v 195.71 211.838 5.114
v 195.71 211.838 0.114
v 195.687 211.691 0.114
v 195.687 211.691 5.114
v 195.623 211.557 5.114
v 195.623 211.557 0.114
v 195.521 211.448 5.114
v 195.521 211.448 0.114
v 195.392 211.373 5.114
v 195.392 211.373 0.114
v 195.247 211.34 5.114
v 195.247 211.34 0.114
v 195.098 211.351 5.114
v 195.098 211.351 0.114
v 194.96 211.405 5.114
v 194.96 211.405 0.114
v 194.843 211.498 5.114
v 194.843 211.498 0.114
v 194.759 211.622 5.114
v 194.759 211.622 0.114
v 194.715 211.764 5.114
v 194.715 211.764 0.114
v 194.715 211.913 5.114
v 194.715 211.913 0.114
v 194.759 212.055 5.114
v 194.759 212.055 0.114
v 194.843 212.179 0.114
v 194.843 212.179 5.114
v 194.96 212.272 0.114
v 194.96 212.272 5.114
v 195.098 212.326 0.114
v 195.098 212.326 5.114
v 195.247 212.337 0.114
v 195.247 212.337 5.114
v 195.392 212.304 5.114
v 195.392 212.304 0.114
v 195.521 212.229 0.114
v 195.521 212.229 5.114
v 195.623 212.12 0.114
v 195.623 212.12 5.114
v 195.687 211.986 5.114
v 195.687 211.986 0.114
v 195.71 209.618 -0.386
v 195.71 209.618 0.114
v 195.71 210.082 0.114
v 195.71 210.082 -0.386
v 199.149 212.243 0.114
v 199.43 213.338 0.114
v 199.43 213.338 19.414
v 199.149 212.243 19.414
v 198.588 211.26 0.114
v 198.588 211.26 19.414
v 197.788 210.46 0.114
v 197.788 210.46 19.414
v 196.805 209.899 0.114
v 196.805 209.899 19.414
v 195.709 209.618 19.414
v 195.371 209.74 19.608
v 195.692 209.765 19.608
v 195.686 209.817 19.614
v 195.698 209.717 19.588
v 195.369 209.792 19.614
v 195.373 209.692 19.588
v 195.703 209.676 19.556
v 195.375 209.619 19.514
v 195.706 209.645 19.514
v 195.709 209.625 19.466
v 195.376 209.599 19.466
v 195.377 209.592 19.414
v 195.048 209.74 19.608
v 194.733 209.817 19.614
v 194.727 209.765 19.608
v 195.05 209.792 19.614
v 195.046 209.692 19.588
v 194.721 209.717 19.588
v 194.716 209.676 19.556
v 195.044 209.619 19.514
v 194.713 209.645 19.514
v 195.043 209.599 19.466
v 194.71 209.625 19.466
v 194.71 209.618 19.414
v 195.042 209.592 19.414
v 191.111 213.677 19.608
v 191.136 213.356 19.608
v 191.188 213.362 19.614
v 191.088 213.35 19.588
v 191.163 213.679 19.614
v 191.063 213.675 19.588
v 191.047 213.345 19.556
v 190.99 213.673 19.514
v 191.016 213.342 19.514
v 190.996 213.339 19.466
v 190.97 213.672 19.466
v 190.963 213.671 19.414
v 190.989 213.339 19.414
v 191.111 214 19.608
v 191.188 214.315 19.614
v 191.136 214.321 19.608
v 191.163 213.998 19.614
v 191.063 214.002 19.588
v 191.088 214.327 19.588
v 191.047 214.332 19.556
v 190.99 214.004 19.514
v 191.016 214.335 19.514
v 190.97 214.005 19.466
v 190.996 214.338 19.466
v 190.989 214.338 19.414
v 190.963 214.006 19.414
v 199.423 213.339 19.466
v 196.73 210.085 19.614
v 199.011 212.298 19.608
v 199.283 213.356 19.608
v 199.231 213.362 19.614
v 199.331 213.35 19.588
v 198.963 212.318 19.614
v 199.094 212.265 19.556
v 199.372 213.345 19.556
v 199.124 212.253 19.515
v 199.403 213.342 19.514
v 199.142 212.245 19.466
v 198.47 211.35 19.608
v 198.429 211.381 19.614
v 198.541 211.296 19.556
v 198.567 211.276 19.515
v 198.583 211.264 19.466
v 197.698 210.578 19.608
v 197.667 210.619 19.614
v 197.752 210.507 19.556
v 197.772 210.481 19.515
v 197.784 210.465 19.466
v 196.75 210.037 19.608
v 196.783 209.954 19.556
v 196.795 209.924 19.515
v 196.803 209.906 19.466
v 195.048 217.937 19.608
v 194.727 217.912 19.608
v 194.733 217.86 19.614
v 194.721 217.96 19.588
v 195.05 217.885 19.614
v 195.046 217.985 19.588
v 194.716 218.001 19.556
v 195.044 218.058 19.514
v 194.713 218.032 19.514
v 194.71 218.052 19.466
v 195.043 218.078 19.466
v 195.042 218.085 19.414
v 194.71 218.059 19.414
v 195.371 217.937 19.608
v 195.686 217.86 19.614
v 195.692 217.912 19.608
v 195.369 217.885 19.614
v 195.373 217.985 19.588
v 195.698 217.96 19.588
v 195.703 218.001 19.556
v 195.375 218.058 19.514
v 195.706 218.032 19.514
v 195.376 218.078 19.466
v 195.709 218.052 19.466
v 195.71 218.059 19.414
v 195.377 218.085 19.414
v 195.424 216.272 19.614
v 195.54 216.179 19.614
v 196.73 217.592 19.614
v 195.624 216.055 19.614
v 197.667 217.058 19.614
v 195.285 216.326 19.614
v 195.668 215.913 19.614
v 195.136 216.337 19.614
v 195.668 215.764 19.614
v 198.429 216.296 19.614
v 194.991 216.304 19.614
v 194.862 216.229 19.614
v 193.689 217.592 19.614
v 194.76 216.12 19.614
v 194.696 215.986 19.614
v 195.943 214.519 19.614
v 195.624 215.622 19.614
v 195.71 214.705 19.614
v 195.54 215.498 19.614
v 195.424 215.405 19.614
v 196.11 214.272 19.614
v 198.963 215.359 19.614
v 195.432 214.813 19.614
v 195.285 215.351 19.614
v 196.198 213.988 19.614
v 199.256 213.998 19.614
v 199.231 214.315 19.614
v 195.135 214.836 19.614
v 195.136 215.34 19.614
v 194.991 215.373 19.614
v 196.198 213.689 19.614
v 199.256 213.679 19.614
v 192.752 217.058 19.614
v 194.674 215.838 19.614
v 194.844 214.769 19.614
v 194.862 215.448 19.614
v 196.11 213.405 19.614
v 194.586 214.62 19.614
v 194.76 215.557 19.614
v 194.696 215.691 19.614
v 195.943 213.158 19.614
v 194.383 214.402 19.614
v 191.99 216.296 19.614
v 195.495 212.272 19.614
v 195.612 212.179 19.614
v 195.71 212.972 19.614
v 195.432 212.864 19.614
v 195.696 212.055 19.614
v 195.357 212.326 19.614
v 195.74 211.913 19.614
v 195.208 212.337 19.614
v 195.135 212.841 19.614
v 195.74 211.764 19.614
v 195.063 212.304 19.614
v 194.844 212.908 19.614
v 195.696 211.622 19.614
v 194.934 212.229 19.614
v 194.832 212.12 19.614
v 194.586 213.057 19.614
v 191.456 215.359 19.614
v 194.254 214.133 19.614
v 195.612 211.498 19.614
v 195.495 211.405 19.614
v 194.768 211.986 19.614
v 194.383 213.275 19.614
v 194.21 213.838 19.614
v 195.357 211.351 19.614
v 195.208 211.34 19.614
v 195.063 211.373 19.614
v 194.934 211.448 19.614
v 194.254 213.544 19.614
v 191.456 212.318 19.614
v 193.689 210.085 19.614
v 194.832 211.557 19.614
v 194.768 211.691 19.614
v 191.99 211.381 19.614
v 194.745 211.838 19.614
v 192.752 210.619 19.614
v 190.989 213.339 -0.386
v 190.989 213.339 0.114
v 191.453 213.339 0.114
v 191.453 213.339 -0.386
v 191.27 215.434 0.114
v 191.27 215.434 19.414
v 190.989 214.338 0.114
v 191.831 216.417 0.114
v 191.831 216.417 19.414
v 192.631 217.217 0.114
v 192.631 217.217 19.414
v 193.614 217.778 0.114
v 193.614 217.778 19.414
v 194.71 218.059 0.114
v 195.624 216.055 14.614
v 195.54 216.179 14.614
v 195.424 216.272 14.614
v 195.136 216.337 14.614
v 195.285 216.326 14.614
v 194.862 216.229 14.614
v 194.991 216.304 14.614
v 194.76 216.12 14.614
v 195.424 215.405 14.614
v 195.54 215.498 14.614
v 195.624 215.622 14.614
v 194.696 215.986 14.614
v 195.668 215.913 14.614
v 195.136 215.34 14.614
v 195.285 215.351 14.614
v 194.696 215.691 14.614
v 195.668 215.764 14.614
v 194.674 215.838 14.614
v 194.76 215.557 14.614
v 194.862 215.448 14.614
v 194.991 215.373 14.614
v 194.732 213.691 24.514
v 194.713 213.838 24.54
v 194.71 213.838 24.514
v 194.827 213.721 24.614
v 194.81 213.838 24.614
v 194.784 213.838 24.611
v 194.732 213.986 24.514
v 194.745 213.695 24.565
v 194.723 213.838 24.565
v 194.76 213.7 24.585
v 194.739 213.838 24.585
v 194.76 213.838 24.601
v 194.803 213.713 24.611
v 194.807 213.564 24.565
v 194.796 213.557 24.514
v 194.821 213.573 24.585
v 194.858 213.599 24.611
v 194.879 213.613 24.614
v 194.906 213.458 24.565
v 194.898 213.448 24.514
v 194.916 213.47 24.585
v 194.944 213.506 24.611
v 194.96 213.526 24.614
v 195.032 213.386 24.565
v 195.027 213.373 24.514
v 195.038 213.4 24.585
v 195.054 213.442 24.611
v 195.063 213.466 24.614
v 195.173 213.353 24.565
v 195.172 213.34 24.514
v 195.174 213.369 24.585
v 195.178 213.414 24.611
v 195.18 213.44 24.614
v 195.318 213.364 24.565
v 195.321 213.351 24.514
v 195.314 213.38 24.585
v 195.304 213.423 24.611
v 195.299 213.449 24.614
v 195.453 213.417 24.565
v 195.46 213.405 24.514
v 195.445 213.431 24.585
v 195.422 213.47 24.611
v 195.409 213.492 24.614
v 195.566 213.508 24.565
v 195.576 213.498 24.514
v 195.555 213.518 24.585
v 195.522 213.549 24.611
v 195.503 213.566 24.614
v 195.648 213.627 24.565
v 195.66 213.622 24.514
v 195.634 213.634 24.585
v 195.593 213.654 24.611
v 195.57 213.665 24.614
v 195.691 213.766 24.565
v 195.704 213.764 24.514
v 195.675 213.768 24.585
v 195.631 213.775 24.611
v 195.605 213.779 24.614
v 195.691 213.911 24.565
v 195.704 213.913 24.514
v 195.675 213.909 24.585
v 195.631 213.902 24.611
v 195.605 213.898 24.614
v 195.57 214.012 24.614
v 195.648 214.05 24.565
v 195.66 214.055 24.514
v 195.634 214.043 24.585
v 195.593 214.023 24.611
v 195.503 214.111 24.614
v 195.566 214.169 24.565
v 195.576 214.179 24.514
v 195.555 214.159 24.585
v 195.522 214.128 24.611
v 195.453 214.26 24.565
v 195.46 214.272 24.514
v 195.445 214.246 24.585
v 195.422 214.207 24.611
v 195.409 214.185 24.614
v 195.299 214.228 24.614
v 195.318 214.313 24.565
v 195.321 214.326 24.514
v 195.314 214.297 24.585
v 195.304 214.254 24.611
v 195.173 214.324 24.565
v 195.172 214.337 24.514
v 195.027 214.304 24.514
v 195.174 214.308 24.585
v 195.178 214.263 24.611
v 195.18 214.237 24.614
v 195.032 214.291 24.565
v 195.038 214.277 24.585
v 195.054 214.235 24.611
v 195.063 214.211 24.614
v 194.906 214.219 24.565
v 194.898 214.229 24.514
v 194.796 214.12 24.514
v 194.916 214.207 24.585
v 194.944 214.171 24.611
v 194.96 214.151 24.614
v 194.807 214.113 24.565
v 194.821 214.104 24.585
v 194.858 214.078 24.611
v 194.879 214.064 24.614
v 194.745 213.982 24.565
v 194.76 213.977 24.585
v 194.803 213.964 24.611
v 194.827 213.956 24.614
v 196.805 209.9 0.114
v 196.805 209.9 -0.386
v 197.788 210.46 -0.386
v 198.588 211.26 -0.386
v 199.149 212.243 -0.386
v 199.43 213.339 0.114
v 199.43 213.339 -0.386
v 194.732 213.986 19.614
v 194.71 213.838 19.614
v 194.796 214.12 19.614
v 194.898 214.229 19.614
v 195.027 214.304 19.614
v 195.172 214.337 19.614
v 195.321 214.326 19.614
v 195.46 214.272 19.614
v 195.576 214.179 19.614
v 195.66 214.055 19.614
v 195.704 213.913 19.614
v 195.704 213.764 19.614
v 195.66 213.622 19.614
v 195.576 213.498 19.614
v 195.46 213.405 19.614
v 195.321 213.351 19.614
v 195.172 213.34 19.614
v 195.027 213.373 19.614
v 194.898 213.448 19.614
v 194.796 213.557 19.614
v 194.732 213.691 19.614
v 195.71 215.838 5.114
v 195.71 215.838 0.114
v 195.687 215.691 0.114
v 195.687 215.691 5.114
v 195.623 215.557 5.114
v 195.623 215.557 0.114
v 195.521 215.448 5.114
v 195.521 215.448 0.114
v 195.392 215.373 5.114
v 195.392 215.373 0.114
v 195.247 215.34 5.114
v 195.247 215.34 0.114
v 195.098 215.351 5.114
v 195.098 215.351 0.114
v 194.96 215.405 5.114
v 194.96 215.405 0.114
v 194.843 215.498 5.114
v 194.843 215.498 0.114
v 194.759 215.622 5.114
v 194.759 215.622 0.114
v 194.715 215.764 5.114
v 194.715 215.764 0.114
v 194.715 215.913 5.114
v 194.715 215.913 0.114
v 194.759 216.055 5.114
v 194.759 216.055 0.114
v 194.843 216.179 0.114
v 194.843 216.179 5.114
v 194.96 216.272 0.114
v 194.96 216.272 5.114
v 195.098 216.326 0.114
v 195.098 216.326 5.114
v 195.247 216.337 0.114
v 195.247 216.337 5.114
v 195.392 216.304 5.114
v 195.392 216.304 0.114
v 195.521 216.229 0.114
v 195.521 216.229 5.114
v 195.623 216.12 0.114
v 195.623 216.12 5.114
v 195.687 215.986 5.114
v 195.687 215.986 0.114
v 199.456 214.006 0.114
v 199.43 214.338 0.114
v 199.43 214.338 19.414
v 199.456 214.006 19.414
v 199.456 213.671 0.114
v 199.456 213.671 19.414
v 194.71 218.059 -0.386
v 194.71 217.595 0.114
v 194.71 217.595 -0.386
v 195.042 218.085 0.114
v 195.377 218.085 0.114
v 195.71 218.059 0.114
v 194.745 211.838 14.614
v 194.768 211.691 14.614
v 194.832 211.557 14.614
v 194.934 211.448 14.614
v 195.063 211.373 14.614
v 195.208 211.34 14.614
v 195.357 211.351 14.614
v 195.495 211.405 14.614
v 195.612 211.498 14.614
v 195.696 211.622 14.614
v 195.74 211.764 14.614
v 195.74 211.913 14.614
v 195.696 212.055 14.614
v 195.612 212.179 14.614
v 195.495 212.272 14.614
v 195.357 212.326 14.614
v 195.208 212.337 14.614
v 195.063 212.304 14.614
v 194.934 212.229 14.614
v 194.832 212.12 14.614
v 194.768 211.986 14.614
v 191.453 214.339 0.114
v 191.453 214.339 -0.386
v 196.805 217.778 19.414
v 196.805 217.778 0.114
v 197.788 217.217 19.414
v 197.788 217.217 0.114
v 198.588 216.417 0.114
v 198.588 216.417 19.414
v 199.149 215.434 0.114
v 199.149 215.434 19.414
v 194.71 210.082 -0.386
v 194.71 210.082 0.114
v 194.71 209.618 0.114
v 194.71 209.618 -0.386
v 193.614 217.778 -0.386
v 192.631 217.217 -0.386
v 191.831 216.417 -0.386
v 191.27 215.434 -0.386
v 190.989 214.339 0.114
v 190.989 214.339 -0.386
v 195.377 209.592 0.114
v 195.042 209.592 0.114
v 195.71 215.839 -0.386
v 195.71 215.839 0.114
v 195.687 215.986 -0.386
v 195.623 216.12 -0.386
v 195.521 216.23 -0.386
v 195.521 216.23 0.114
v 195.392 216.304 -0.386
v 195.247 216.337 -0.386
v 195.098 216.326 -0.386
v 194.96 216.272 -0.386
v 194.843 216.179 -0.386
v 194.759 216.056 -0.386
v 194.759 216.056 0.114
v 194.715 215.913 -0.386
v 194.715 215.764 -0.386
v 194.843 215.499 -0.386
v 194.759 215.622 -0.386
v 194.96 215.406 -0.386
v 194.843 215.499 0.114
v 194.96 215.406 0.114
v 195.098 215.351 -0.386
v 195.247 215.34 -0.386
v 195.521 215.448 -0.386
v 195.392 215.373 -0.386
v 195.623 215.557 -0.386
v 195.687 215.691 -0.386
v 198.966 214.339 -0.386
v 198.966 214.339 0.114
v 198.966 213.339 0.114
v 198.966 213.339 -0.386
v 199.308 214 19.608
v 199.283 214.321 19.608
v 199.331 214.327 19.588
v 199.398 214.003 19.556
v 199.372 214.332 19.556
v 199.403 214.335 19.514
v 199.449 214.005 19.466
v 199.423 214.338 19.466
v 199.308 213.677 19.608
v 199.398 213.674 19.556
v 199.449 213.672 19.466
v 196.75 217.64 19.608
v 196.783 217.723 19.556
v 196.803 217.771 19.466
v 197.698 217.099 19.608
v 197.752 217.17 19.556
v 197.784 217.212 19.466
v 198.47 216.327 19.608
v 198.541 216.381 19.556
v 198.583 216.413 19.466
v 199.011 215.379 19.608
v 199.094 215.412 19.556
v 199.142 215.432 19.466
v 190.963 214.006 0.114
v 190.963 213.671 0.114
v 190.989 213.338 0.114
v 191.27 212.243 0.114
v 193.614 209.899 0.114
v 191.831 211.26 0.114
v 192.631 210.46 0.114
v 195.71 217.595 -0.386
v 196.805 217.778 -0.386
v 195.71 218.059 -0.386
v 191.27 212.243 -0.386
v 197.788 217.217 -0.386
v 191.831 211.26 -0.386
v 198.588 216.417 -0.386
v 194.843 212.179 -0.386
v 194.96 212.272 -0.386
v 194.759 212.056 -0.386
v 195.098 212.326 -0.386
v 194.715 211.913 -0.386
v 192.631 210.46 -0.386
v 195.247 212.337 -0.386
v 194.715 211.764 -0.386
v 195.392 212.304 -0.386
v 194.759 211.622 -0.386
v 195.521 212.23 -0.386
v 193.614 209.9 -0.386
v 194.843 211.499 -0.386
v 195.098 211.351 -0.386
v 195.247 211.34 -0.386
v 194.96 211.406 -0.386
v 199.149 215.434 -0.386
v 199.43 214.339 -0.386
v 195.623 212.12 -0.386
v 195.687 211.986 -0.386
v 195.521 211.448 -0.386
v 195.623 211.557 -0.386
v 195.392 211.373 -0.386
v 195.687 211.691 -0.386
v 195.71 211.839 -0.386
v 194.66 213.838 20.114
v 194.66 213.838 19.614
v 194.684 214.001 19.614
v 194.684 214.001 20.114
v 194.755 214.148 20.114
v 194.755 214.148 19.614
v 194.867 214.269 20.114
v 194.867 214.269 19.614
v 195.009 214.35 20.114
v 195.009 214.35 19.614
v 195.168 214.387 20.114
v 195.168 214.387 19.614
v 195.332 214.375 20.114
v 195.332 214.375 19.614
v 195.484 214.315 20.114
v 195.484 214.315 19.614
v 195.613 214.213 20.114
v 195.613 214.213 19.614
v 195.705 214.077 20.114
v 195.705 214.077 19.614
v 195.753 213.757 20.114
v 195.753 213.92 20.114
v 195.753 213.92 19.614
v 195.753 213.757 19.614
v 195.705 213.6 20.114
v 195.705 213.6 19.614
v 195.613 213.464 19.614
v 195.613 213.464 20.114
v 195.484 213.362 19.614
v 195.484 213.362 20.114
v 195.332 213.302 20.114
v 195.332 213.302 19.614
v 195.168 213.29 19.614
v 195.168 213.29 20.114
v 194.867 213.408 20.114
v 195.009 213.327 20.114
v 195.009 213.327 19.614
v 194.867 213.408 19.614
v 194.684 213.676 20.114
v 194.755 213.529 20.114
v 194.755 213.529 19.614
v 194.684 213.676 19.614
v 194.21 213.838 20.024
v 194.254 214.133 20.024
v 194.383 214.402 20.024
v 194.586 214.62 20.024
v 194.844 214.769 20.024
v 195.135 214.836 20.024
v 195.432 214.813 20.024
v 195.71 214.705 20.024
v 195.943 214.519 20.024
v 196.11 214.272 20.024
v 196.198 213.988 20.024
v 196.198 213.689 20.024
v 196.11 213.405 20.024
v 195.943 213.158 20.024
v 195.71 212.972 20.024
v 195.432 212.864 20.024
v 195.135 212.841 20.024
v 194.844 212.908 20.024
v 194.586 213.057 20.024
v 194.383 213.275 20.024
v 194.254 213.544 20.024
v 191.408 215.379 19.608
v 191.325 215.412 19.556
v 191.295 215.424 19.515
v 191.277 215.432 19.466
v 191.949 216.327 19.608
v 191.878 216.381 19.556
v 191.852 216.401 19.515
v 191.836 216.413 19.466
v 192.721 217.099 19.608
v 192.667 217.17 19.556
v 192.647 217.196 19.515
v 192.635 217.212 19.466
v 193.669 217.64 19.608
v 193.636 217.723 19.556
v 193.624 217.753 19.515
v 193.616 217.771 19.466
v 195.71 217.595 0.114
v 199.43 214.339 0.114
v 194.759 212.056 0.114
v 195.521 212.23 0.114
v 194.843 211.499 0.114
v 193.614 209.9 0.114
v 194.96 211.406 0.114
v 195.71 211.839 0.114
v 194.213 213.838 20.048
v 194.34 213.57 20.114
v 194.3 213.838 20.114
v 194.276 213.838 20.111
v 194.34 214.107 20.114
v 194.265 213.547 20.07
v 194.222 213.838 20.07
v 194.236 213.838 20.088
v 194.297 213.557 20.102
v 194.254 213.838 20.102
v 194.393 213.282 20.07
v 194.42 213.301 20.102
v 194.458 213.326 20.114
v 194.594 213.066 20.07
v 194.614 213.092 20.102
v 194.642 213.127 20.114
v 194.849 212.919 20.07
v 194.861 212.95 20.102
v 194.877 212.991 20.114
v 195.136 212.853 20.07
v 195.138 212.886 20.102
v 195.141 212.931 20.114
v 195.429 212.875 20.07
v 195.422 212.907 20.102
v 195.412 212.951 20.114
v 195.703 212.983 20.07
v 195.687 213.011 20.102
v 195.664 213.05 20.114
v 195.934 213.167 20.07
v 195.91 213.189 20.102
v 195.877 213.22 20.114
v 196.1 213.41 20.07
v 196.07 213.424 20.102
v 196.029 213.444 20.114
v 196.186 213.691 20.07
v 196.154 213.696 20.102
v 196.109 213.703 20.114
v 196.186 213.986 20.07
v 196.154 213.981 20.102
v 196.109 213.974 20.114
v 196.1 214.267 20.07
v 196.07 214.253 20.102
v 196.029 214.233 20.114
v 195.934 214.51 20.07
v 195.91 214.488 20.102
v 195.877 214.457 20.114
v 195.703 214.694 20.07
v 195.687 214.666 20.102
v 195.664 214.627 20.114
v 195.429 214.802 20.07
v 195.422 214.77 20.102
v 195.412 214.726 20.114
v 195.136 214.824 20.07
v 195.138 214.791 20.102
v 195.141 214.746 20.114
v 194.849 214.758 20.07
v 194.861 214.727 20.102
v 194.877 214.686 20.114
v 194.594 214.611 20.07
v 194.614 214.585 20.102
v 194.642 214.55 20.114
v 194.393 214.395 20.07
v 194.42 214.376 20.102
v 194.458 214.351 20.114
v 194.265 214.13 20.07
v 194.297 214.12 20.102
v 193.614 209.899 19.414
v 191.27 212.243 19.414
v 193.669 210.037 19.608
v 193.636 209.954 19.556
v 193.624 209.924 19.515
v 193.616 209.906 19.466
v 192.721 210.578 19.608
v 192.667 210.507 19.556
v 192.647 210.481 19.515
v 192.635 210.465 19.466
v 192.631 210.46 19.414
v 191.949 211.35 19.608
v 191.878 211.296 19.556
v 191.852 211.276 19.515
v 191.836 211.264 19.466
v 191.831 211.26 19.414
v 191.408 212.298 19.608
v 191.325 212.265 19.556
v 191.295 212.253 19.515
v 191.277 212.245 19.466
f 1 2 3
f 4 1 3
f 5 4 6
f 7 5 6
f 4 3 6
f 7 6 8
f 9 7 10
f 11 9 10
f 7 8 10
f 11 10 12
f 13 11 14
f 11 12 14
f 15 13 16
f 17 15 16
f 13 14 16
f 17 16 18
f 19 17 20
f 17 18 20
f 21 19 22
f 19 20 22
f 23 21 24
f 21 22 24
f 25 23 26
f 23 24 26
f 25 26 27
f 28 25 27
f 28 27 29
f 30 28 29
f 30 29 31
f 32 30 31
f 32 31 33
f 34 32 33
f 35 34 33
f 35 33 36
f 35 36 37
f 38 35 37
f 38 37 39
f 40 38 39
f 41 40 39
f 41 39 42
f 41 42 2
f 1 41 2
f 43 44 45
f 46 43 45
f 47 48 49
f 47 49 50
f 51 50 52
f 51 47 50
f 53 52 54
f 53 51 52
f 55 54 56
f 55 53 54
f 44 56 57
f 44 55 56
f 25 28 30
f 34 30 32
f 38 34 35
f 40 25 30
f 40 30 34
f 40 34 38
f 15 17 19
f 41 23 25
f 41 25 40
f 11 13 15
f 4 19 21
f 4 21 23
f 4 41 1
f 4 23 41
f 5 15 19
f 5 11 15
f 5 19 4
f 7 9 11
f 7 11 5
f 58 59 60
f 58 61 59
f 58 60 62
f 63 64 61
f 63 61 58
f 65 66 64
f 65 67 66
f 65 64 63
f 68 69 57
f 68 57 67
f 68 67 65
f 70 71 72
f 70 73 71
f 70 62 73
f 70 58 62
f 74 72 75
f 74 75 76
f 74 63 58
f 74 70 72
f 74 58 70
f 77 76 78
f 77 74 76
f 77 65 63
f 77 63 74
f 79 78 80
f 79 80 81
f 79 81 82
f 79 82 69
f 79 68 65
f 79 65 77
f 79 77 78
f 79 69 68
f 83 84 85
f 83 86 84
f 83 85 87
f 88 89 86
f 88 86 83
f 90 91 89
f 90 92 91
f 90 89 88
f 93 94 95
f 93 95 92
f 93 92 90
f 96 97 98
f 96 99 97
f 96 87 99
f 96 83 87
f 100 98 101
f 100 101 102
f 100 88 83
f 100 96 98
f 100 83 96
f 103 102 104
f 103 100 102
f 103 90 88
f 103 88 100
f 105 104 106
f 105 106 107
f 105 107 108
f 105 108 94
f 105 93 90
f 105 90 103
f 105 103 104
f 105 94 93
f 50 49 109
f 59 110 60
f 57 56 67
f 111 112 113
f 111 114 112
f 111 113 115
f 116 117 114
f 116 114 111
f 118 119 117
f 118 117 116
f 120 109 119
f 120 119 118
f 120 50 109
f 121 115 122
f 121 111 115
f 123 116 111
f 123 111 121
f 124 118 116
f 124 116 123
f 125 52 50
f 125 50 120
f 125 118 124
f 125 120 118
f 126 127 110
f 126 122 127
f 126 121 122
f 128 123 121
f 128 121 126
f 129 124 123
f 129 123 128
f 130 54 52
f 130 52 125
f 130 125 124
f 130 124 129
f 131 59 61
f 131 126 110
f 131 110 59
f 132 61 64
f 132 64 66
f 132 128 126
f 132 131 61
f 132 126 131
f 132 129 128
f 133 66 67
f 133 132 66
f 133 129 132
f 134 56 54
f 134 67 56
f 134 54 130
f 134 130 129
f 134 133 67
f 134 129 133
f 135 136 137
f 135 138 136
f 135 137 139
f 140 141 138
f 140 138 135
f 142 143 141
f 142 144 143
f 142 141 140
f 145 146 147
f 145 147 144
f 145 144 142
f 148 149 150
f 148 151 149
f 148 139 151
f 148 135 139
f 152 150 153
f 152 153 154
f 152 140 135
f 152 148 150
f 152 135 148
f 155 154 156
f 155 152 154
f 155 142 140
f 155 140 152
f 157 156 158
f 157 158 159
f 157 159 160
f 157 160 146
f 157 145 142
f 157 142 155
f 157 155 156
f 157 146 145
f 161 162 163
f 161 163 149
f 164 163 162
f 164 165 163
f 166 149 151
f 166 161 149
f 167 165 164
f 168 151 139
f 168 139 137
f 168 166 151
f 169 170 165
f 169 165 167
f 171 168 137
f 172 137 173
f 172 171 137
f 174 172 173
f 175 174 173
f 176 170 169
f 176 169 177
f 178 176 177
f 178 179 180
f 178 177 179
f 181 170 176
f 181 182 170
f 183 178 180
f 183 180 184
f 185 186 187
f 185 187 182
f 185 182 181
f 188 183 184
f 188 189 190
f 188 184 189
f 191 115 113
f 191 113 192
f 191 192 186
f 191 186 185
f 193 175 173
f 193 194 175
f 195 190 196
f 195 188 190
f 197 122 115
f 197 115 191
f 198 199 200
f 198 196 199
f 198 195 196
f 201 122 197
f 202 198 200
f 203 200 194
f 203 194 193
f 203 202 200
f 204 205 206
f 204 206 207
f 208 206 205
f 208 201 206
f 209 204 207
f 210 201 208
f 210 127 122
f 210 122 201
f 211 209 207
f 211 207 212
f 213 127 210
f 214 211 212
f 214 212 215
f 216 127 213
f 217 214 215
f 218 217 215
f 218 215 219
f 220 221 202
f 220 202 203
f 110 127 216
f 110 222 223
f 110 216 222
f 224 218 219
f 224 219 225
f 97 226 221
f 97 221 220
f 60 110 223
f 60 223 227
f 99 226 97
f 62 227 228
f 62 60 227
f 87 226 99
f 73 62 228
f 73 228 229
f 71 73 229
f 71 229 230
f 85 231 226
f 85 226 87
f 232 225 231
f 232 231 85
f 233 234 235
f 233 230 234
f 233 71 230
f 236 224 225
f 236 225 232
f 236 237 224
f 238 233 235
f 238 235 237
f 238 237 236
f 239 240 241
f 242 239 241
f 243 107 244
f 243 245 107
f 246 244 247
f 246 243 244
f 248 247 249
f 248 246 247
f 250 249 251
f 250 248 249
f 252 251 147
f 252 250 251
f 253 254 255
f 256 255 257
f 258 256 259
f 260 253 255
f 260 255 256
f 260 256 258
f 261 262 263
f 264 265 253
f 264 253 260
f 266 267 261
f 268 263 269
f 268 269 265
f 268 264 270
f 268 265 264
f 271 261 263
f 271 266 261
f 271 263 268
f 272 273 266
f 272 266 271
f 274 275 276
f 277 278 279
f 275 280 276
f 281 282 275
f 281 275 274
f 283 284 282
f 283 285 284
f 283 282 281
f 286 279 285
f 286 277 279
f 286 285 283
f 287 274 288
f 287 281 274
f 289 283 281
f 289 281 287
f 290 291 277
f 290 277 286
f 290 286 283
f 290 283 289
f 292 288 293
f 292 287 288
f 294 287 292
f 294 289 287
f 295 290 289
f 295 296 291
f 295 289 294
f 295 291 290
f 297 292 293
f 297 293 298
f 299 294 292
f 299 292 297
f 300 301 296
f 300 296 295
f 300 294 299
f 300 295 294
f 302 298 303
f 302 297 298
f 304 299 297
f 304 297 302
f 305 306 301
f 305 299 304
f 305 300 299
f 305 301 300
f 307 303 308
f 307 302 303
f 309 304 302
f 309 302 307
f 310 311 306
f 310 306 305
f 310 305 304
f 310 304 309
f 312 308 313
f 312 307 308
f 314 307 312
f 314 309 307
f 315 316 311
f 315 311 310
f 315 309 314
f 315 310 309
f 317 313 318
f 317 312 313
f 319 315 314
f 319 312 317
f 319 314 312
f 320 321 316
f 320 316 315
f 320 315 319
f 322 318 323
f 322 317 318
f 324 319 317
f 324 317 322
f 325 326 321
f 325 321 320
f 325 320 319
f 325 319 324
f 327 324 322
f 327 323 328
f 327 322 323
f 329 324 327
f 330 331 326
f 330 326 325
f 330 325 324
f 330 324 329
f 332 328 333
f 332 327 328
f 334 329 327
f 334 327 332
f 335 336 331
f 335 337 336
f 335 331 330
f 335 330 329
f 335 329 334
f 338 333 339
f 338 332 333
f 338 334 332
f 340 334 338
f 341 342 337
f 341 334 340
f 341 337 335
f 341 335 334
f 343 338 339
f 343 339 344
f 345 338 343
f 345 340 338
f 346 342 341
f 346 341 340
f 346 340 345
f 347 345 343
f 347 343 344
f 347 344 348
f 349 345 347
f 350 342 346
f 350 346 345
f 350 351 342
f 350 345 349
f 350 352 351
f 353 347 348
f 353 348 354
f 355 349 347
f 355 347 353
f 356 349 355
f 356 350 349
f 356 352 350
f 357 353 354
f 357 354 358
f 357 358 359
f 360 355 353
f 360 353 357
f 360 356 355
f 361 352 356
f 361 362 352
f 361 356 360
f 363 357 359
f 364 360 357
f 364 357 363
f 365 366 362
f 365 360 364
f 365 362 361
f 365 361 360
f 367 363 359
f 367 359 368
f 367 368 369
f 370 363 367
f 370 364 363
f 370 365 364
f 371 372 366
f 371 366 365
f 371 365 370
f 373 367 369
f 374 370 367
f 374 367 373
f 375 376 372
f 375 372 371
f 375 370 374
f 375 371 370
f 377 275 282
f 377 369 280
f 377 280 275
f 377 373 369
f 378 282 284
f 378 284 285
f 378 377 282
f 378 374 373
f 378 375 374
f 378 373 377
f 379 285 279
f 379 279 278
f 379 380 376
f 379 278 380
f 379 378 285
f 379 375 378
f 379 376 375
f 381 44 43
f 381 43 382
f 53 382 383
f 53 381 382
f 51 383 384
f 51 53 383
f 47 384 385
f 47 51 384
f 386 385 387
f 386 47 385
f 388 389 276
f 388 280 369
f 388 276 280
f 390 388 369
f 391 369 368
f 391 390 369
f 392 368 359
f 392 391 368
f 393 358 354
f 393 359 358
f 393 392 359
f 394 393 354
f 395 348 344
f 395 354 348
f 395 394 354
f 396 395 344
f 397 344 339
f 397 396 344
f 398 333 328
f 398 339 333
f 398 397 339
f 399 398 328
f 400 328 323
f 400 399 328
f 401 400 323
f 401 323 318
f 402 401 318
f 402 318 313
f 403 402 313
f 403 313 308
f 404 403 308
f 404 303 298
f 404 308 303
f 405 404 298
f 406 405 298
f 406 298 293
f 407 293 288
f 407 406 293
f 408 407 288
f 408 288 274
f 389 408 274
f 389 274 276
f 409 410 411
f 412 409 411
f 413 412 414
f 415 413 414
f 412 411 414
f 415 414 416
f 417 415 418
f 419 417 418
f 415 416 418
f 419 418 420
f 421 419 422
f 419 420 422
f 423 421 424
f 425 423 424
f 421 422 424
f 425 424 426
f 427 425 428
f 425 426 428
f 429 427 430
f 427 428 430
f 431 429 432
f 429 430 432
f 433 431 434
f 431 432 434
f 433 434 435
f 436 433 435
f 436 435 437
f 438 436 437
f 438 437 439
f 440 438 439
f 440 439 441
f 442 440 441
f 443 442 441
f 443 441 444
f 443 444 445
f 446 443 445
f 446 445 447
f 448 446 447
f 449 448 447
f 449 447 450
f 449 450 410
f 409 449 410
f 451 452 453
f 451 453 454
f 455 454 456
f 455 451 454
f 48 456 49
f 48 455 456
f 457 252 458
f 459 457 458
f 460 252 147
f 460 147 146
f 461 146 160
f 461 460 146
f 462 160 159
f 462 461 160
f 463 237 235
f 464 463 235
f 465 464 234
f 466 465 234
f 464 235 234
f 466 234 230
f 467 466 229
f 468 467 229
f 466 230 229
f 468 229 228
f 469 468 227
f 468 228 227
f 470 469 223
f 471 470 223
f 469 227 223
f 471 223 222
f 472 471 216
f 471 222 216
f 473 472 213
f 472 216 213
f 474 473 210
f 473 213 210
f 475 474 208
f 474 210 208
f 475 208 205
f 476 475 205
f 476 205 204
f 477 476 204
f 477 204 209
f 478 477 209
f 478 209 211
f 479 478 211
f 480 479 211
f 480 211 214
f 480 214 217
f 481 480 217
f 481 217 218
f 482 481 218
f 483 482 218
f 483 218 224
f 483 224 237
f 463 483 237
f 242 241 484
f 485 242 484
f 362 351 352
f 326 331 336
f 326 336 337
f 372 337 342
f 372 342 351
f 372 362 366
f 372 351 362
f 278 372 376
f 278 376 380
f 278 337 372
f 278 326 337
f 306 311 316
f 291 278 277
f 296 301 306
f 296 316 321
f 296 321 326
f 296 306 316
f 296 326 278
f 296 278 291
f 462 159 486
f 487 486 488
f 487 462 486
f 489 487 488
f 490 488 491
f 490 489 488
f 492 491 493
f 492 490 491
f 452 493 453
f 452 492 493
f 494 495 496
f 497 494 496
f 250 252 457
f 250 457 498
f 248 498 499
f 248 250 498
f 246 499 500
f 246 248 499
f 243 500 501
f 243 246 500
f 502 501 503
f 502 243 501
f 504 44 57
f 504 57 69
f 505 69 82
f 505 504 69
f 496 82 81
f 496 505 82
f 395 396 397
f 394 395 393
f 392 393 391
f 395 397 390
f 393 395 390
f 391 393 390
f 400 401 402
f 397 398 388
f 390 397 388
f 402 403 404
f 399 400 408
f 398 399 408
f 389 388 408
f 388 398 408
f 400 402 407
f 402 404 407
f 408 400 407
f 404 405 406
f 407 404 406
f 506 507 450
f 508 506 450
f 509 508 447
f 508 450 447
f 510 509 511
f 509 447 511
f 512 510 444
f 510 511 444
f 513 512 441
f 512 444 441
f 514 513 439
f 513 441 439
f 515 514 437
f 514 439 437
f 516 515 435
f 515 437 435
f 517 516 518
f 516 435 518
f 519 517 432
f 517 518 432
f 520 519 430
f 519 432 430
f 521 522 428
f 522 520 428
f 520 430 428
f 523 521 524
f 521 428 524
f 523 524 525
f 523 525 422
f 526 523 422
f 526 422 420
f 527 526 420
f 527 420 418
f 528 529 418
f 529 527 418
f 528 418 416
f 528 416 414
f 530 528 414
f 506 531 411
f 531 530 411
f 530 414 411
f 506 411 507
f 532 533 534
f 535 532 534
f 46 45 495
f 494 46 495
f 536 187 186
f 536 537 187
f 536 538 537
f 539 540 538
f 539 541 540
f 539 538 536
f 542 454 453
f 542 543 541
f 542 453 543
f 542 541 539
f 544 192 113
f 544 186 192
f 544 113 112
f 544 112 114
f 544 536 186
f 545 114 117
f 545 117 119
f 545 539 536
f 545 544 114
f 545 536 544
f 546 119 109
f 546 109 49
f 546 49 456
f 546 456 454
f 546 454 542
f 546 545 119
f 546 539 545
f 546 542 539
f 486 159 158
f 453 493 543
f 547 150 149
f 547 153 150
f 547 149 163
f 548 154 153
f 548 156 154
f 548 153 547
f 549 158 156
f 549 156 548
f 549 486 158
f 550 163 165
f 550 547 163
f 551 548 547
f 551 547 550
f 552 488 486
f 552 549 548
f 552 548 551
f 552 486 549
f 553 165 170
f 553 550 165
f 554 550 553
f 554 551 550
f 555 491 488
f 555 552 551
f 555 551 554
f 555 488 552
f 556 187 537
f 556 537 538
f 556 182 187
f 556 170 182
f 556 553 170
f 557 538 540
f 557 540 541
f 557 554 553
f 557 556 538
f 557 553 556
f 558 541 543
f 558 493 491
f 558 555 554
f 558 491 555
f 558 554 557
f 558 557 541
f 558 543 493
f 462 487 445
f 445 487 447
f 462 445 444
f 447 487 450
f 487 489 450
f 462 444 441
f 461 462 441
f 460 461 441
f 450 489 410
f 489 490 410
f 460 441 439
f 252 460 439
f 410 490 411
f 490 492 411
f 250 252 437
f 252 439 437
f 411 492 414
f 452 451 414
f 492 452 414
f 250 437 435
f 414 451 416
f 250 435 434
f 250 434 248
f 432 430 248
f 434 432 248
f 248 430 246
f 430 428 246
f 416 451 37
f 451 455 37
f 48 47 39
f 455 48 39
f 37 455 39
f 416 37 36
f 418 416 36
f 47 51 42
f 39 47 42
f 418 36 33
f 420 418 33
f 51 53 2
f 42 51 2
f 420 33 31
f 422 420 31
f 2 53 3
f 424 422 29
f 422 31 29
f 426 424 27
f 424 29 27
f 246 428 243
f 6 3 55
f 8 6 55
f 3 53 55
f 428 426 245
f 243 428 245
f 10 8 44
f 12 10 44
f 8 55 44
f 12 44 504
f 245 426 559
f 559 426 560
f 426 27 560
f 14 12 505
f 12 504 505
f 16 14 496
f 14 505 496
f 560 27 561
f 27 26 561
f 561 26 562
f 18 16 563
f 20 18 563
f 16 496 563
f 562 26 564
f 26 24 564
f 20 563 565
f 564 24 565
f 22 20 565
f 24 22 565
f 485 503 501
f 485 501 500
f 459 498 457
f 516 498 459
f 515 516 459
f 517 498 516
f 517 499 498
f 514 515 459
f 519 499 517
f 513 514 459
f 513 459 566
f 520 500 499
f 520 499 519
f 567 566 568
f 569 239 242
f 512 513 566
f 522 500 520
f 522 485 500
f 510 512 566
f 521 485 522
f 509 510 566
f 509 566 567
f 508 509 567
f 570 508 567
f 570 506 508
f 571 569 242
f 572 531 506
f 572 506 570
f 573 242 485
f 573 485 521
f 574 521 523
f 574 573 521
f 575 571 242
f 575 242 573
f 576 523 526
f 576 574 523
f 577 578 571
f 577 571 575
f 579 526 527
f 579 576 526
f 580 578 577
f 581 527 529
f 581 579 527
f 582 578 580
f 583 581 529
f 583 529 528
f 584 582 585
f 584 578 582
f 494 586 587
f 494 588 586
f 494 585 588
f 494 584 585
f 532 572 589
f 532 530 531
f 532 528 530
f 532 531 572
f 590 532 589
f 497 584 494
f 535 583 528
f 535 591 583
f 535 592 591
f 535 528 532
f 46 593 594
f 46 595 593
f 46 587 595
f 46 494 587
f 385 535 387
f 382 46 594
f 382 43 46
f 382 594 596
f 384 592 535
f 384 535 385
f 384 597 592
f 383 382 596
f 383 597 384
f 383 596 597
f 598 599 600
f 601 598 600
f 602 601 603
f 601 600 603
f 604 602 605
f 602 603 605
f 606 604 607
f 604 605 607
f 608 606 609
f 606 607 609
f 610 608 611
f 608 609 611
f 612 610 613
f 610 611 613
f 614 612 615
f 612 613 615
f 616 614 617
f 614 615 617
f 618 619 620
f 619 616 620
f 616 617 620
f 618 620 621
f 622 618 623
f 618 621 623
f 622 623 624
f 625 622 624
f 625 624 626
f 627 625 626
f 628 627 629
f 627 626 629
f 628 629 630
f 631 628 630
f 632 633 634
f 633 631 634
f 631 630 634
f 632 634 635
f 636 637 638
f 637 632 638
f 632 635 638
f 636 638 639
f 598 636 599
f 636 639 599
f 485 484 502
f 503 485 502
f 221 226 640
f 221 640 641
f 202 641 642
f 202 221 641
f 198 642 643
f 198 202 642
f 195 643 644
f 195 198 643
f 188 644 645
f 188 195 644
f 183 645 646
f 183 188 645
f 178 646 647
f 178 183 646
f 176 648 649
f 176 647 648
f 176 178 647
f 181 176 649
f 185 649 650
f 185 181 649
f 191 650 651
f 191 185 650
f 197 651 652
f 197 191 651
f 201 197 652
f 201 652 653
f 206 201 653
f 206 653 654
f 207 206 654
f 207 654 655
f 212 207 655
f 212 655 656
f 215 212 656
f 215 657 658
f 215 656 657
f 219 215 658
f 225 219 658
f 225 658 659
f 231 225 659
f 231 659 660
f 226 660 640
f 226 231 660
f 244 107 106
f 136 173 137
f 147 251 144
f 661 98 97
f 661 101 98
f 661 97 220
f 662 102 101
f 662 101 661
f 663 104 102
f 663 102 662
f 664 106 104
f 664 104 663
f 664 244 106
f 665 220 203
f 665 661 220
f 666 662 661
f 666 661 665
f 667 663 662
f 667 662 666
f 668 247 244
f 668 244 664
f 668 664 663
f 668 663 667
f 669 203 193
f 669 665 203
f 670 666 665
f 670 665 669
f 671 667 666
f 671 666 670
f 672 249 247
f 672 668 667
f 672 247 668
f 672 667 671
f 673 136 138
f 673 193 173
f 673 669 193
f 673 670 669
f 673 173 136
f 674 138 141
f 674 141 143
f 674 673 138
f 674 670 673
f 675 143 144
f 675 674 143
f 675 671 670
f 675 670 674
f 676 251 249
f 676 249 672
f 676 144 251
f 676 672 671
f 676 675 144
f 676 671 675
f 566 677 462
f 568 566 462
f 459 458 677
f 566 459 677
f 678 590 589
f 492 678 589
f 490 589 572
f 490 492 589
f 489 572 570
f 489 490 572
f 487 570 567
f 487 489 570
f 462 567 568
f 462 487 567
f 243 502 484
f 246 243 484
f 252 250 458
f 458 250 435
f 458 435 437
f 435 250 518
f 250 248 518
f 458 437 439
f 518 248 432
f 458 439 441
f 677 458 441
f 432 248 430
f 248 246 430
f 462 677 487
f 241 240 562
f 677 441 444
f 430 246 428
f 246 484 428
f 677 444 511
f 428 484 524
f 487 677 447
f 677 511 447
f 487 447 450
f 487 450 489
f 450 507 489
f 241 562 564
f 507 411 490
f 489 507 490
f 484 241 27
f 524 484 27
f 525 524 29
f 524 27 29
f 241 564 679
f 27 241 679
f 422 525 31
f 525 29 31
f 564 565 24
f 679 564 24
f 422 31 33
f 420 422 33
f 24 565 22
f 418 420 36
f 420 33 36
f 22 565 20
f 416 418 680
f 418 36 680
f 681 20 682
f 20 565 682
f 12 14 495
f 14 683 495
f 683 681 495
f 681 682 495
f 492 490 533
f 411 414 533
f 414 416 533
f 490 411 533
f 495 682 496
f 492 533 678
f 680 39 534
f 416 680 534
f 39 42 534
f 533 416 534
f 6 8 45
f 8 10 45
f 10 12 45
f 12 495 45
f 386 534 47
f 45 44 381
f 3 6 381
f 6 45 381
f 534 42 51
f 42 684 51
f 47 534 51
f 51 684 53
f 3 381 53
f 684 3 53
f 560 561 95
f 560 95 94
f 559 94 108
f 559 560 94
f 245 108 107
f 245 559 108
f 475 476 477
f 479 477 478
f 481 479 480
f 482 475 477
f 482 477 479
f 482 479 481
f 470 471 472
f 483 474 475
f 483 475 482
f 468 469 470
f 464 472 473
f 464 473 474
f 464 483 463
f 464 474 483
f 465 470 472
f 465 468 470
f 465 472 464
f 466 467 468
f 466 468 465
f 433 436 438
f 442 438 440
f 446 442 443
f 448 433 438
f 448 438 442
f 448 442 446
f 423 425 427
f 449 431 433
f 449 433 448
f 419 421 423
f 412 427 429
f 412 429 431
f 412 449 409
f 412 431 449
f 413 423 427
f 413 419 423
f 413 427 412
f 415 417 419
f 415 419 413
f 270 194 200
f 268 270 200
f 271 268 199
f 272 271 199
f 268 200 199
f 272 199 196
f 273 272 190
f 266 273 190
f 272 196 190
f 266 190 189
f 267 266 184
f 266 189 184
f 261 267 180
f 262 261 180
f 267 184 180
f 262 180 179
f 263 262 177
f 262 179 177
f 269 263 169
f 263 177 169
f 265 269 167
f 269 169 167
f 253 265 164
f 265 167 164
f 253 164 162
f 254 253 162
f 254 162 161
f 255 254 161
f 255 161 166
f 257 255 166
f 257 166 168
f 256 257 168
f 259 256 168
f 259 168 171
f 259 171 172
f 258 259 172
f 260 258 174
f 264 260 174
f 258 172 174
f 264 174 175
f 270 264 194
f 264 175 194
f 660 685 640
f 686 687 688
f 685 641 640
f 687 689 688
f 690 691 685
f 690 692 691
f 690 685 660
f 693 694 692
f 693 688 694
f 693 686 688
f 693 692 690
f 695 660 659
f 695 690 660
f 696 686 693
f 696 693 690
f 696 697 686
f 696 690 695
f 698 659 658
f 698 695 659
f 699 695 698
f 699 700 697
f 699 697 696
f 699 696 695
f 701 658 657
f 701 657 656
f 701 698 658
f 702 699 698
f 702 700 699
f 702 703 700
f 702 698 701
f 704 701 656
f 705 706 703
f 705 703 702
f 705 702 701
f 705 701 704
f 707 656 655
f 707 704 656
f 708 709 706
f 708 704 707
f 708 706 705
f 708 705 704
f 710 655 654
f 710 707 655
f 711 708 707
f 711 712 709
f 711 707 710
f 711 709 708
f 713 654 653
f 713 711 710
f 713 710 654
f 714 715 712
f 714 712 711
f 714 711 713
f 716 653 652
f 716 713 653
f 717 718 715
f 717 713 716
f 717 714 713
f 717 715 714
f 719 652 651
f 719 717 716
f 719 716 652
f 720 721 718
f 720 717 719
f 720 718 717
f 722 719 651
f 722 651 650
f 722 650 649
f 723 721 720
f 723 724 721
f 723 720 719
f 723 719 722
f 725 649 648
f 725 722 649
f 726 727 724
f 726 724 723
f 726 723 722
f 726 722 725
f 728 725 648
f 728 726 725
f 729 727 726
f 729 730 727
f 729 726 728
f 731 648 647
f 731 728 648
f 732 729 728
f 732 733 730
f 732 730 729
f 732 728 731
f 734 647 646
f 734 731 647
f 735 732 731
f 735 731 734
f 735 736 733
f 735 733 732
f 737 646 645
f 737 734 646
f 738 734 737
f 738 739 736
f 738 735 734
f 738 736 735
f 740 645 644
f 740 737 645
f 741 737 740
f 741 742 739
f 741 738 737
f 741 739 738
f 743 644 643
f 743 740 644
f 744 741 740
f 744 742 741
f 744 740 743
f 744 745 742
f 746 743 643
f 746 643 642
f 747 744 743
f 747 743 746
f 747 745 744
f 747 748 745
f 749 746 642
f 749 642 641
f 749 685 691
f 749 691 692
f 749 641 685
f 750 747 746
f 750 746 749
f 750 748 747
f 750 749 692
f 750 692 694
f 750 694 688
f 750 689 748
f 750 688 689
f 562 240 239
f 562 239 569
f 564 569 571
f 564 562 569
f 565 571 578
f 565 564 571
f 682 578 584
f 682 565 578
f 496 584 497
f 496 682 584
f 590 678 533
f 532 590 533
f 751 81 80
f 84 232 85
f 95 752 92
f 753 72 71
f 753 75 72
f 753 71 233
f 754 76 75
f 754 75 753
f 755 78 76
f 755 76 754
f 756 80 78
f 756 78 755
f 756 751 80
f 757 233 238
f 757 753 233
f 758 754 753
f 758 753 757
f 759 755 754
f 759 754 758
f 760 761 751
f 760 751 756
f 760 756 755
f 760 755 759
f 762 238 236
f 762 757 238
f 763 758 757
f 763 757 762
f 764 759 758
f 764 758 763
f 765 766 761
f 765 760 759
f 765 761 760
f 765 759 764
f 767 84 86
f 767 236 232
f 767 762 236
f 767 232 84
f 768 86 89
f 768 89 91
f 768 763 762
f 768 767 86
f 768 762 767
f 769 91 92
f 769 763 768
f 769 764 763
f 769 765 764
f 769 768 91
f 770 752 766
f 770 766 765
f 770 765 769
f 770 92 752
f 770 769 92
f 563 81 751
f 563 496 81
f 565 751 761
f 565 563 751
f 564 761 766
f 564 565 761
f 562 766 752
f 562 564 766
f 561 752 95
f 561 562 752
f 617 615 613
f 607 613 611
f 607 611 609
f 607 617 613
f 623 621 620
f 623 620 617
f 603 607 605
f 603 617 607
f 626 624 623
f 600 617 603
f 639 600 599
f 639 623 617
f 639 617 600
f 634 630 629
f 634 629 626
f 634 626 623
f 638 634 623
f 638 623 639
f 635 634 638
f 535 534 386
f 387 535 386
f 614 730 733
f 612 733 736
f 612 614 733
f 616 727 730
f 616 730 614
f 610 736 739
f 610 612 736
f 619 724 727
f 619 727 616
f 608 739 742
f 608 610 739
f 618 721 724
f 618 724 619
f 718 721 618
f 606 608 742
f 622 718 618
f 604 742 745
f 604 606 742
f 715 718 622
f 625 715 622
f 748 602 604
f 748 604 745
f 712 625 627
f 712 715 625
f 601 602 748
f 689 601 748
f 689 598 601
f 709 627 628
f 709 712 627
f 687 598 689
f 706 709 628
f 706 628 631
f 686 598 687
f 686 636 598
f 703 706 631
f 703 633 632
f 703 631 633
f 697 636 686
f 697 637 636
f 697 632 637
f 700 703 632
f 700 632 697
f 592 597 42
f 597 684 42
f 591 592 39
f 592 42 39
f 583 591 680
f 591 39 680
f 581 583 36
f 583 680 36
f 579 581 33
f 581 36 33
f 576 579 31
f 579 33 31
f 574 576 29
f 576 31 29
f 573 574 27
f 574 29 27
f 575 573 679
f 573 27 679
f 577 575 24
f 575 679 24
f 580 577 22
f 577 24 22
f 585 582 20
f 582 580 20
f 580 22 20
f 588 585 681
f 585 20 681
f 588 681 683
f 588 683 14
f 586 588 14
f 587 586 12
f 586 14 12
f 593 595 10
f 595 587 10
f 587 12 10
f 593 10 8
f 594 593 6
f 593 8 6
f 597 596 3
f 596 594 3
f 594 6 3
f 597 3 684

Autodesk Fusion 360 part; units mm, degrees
sketch "Sketch1" plane through (0, 0, 0) normal (0, 0, 1) x (1, 0, 0)
  line L0 (196.5, 218.4641) -> (196.5, 218)
  line L1 (196.5, 218) -> (195.5, 218)
  line L2 (195.5, 218) -> (195.5, 218.4641)
  line L3 (191.7795, 214.7436) -> (192.2436, 214.7436)
  line L4 (192.2436, 214.7436) -> (192.2436, 213.7436)
  line L5 (192.2436, 213.7436) -> (191.7795, 213.7436)
  line L6 (195.5, 210.0231) -> (195.5, 210.4872)
  line L7 (195.5, 210.4872) -> (196.5, 210.4872)
  line L8 (196.5, 210.4872) -> (196.5, 210.0231)
  line L9 (200.2205, 213.7436) -> (199.7564, 213.7436)
  line L10 (199.7564, 213.7436) -> (199.7564, 214.7436)
  line L11 (199.7564, 214.7436) -> (200.2205, 214.7436)
  arc A0 (200.2205, 214.7436) -> (196.5, 218.4641) centre (196, 214.2436) ccw
  arc A1 (196.5, 210.0231) -> (200.2205, 213.7436) centre (196, 214.2436) ccw
  arc A2 (195.5, 218.4641) -> (191.7795, 214.7436) centre (196, 214.2436) ccw
  arc A3 (191.7795, 213.7436) -> (195.5, 210.0231) centre (196, 214.2436) ccw
  circle A4 centre (196, 216.2436) radius 0.5
  circle A5 centre (196, 212.2436) radius 0.5
  dimension "d1" = 8.5
  dimension "d6" = 0.5
  dimension "d8" = 360
  dimension "d9" = 0.4641
  dimension "d10" = 0.4641
  dimension "d14" = 1
  dimension "d15" = 1
  dimension "d16" = 2
  dimension "d17" = 2
extrude "Extrude1" add sketch "Sketch1" along normal blind 0.5 makes body 1 in component "Motor Base Platic"
sketch "Sketch3" plane through (0, 0, 0.5) normal (0, 0, 1) x (-1, 0, 0)
  circle A0 centre (-196, -212.2436) radius 0.5
  circle A1 centre (-196, -216.2436) radius 0.5
  arc A2 (-191.7795, -213.7436) -> (-195.5, -210.0231) centre (-196, -214.2436) ccw
  line L0 (-195.5, -210.0231) -> (-195.5, -210.4872)
  line L1 (-195.5, -210.4872) -> (-196.5, -210.4872)
  line L2 (-196.5, -210.4872) -> (-196.5, -210.0231)
  arc A3 (-196.5, -210.0231) -> (-200.2205, -213.7436) centre (-196, -214.2436) ccw
  line L3 (-200.2205, -213.7436) -> (-199.7564, -213.7436)
  line L4 (-199.7564, -213.7436) -> (-199.7564, -214.7436)
  line L5 (-199.7564, -214.7436) -> (-200.2205, -214.7436)
  arc A4 (-200.2205, -214.7436) -> (-196.5, -218.4641) centre (-196, -214.2436) ccw
  line L6 (-196.5, -218.4641) -> (-196.5, -218)
  line L7 (-196.5, -218) -> (-195.5, -218)
  line L8 (-195.5, -218) -> (-195.5, -218.4641)
  arc A5 (-195.5, -218.4641) -> (-191.7795, -214.7436) centre (-196, -214.2436) ccw
  line L9 (-191.7795, -214.7436) -> (-192.2436, -214.7436)
  line L10 (-192.2436, -214.7436) -> (-192.2436, -213.7436)
  line L11 (-192.2436, -213.7436) -> (-191.7795, -213.7436)
  circle A6 centre (-196, -214.2436) radius 4.25
  dimension "d20" = 8.5
extrude "Extrude1'" add sketch "Sketch3" along normal blind 19.5 separate body contours A0 | A1 | A2 L0 L1 L2 A3 L3 L4 L5 A4 L6 L7 L8 A5 L9 L10 L11 A6 | L9 L10 L11 A6 | L0 L1 L2 A6 | L3 L4 L5 A6 | L6 L7 L8 A6 makes body 2 in component "Motor Body"
sketch "Sketch4" plane through (0, 0, 20) normal (0, 0, 1) x (-1, 0, 0)
  circle A0 centre (-196, -214.2436) radius 4.25
  circle A1 centre (-196, -214.2436) radius 1
  circle A2 centre (-196, -214.2436) radius 0.55
  dimension "d23" = 2
  dimension "d24" = 1.1
extrude "Extrude2" add sketch "Sketch4" along normal blind 0.5 contours A1 bodies 2 in component "Motor Body"
fillet "Fillet1" radius 0.09 1 edges at (196.9323, 214.6052, 20.5) on bodies 2 in component "Motor Body"
sketch "Sketch5" plane through (0, 0, 20) normal (0, 0, 1) x (-1, 0, 0)
  circle A0 centre (-196, -214.2436) radius 0.55
  circle A1 centre (-196, -214.2436) radius 0.5
  dimension "d28" = 1
extrude "Extrude1''" add sketch "Sketch5" along normal blind 5 separate body contours A1 makes body 3 in component "Motor Rotor"
sketch "Sketch6" plane through (0, 0, 20) normal (0, 0, 1) x (-1, 0, 0)
  circle A0 centre (-196, -214.2436) radius 4.25
  circle A1 centre (-196, -214.2436) radius 1
  circle A2 centre (-195.9641, -216.2436) radius 0.5
  circle A3 centre (-196.0359, -212.2436) radius 0.5
  point P0 (-196, -214.2436)
  dimension "d31" = 1
  dimension "d32" = 1
  dimension "d33" = 4
  dimension "d34" = 2
extrude "Extrude3" cut sketch "Sketch6" against normal blind 5 contours A2 | A3 bodies 2 in component "Motor Body"
sketch "Sketch7" plane through (0, 0, 0.5) normal (0, 0, -1) x (1, 0, 0)
  circle A0 centre (196, -214.2436) radius 4.25
  circle A1 centre (196, -212.2436) radius 0.5
  circle A2 centre (196, -216.2436) radius 0.5
  point P0 (196, -212.2436)
  point P1 (196, -216.2436)
  dimension "d37" = 1
  dimension "d38" = 1
  dimension "d39" = 1
extrude "Extrude4" cut sketch "Sketch7" against normal blind 5 contours A1 | A2 bodies 2 in component "Motor Body"
fillet "Fillet1'" radius 0.1 1 edges at (196.4662, 214.4244, 25) on bodies 3 in component "Motor Rotor"
fillet "Fillet2" radius 0.2 1 edges at (199.9624, 215.7805, 20) on bodies 2 in component "Motor Body"
component "Motor Base Platic" placed x (1, 0, 0) y (0, -1, 0) z (0, 0, -1) at (-0.7905, 428.0822, 0.1145)
component "Motor Body" placed x (1, 0, 0) y (0, 1, 0) z (0, 0, 1) at (-0.7905, -0.4051, -0.3855)
component "Motor Rotor" placed x (1, 0, 0) y (0, 1, 0) z (0, 0, 1) at (-0.7905, -0.4051, -0.3855)
